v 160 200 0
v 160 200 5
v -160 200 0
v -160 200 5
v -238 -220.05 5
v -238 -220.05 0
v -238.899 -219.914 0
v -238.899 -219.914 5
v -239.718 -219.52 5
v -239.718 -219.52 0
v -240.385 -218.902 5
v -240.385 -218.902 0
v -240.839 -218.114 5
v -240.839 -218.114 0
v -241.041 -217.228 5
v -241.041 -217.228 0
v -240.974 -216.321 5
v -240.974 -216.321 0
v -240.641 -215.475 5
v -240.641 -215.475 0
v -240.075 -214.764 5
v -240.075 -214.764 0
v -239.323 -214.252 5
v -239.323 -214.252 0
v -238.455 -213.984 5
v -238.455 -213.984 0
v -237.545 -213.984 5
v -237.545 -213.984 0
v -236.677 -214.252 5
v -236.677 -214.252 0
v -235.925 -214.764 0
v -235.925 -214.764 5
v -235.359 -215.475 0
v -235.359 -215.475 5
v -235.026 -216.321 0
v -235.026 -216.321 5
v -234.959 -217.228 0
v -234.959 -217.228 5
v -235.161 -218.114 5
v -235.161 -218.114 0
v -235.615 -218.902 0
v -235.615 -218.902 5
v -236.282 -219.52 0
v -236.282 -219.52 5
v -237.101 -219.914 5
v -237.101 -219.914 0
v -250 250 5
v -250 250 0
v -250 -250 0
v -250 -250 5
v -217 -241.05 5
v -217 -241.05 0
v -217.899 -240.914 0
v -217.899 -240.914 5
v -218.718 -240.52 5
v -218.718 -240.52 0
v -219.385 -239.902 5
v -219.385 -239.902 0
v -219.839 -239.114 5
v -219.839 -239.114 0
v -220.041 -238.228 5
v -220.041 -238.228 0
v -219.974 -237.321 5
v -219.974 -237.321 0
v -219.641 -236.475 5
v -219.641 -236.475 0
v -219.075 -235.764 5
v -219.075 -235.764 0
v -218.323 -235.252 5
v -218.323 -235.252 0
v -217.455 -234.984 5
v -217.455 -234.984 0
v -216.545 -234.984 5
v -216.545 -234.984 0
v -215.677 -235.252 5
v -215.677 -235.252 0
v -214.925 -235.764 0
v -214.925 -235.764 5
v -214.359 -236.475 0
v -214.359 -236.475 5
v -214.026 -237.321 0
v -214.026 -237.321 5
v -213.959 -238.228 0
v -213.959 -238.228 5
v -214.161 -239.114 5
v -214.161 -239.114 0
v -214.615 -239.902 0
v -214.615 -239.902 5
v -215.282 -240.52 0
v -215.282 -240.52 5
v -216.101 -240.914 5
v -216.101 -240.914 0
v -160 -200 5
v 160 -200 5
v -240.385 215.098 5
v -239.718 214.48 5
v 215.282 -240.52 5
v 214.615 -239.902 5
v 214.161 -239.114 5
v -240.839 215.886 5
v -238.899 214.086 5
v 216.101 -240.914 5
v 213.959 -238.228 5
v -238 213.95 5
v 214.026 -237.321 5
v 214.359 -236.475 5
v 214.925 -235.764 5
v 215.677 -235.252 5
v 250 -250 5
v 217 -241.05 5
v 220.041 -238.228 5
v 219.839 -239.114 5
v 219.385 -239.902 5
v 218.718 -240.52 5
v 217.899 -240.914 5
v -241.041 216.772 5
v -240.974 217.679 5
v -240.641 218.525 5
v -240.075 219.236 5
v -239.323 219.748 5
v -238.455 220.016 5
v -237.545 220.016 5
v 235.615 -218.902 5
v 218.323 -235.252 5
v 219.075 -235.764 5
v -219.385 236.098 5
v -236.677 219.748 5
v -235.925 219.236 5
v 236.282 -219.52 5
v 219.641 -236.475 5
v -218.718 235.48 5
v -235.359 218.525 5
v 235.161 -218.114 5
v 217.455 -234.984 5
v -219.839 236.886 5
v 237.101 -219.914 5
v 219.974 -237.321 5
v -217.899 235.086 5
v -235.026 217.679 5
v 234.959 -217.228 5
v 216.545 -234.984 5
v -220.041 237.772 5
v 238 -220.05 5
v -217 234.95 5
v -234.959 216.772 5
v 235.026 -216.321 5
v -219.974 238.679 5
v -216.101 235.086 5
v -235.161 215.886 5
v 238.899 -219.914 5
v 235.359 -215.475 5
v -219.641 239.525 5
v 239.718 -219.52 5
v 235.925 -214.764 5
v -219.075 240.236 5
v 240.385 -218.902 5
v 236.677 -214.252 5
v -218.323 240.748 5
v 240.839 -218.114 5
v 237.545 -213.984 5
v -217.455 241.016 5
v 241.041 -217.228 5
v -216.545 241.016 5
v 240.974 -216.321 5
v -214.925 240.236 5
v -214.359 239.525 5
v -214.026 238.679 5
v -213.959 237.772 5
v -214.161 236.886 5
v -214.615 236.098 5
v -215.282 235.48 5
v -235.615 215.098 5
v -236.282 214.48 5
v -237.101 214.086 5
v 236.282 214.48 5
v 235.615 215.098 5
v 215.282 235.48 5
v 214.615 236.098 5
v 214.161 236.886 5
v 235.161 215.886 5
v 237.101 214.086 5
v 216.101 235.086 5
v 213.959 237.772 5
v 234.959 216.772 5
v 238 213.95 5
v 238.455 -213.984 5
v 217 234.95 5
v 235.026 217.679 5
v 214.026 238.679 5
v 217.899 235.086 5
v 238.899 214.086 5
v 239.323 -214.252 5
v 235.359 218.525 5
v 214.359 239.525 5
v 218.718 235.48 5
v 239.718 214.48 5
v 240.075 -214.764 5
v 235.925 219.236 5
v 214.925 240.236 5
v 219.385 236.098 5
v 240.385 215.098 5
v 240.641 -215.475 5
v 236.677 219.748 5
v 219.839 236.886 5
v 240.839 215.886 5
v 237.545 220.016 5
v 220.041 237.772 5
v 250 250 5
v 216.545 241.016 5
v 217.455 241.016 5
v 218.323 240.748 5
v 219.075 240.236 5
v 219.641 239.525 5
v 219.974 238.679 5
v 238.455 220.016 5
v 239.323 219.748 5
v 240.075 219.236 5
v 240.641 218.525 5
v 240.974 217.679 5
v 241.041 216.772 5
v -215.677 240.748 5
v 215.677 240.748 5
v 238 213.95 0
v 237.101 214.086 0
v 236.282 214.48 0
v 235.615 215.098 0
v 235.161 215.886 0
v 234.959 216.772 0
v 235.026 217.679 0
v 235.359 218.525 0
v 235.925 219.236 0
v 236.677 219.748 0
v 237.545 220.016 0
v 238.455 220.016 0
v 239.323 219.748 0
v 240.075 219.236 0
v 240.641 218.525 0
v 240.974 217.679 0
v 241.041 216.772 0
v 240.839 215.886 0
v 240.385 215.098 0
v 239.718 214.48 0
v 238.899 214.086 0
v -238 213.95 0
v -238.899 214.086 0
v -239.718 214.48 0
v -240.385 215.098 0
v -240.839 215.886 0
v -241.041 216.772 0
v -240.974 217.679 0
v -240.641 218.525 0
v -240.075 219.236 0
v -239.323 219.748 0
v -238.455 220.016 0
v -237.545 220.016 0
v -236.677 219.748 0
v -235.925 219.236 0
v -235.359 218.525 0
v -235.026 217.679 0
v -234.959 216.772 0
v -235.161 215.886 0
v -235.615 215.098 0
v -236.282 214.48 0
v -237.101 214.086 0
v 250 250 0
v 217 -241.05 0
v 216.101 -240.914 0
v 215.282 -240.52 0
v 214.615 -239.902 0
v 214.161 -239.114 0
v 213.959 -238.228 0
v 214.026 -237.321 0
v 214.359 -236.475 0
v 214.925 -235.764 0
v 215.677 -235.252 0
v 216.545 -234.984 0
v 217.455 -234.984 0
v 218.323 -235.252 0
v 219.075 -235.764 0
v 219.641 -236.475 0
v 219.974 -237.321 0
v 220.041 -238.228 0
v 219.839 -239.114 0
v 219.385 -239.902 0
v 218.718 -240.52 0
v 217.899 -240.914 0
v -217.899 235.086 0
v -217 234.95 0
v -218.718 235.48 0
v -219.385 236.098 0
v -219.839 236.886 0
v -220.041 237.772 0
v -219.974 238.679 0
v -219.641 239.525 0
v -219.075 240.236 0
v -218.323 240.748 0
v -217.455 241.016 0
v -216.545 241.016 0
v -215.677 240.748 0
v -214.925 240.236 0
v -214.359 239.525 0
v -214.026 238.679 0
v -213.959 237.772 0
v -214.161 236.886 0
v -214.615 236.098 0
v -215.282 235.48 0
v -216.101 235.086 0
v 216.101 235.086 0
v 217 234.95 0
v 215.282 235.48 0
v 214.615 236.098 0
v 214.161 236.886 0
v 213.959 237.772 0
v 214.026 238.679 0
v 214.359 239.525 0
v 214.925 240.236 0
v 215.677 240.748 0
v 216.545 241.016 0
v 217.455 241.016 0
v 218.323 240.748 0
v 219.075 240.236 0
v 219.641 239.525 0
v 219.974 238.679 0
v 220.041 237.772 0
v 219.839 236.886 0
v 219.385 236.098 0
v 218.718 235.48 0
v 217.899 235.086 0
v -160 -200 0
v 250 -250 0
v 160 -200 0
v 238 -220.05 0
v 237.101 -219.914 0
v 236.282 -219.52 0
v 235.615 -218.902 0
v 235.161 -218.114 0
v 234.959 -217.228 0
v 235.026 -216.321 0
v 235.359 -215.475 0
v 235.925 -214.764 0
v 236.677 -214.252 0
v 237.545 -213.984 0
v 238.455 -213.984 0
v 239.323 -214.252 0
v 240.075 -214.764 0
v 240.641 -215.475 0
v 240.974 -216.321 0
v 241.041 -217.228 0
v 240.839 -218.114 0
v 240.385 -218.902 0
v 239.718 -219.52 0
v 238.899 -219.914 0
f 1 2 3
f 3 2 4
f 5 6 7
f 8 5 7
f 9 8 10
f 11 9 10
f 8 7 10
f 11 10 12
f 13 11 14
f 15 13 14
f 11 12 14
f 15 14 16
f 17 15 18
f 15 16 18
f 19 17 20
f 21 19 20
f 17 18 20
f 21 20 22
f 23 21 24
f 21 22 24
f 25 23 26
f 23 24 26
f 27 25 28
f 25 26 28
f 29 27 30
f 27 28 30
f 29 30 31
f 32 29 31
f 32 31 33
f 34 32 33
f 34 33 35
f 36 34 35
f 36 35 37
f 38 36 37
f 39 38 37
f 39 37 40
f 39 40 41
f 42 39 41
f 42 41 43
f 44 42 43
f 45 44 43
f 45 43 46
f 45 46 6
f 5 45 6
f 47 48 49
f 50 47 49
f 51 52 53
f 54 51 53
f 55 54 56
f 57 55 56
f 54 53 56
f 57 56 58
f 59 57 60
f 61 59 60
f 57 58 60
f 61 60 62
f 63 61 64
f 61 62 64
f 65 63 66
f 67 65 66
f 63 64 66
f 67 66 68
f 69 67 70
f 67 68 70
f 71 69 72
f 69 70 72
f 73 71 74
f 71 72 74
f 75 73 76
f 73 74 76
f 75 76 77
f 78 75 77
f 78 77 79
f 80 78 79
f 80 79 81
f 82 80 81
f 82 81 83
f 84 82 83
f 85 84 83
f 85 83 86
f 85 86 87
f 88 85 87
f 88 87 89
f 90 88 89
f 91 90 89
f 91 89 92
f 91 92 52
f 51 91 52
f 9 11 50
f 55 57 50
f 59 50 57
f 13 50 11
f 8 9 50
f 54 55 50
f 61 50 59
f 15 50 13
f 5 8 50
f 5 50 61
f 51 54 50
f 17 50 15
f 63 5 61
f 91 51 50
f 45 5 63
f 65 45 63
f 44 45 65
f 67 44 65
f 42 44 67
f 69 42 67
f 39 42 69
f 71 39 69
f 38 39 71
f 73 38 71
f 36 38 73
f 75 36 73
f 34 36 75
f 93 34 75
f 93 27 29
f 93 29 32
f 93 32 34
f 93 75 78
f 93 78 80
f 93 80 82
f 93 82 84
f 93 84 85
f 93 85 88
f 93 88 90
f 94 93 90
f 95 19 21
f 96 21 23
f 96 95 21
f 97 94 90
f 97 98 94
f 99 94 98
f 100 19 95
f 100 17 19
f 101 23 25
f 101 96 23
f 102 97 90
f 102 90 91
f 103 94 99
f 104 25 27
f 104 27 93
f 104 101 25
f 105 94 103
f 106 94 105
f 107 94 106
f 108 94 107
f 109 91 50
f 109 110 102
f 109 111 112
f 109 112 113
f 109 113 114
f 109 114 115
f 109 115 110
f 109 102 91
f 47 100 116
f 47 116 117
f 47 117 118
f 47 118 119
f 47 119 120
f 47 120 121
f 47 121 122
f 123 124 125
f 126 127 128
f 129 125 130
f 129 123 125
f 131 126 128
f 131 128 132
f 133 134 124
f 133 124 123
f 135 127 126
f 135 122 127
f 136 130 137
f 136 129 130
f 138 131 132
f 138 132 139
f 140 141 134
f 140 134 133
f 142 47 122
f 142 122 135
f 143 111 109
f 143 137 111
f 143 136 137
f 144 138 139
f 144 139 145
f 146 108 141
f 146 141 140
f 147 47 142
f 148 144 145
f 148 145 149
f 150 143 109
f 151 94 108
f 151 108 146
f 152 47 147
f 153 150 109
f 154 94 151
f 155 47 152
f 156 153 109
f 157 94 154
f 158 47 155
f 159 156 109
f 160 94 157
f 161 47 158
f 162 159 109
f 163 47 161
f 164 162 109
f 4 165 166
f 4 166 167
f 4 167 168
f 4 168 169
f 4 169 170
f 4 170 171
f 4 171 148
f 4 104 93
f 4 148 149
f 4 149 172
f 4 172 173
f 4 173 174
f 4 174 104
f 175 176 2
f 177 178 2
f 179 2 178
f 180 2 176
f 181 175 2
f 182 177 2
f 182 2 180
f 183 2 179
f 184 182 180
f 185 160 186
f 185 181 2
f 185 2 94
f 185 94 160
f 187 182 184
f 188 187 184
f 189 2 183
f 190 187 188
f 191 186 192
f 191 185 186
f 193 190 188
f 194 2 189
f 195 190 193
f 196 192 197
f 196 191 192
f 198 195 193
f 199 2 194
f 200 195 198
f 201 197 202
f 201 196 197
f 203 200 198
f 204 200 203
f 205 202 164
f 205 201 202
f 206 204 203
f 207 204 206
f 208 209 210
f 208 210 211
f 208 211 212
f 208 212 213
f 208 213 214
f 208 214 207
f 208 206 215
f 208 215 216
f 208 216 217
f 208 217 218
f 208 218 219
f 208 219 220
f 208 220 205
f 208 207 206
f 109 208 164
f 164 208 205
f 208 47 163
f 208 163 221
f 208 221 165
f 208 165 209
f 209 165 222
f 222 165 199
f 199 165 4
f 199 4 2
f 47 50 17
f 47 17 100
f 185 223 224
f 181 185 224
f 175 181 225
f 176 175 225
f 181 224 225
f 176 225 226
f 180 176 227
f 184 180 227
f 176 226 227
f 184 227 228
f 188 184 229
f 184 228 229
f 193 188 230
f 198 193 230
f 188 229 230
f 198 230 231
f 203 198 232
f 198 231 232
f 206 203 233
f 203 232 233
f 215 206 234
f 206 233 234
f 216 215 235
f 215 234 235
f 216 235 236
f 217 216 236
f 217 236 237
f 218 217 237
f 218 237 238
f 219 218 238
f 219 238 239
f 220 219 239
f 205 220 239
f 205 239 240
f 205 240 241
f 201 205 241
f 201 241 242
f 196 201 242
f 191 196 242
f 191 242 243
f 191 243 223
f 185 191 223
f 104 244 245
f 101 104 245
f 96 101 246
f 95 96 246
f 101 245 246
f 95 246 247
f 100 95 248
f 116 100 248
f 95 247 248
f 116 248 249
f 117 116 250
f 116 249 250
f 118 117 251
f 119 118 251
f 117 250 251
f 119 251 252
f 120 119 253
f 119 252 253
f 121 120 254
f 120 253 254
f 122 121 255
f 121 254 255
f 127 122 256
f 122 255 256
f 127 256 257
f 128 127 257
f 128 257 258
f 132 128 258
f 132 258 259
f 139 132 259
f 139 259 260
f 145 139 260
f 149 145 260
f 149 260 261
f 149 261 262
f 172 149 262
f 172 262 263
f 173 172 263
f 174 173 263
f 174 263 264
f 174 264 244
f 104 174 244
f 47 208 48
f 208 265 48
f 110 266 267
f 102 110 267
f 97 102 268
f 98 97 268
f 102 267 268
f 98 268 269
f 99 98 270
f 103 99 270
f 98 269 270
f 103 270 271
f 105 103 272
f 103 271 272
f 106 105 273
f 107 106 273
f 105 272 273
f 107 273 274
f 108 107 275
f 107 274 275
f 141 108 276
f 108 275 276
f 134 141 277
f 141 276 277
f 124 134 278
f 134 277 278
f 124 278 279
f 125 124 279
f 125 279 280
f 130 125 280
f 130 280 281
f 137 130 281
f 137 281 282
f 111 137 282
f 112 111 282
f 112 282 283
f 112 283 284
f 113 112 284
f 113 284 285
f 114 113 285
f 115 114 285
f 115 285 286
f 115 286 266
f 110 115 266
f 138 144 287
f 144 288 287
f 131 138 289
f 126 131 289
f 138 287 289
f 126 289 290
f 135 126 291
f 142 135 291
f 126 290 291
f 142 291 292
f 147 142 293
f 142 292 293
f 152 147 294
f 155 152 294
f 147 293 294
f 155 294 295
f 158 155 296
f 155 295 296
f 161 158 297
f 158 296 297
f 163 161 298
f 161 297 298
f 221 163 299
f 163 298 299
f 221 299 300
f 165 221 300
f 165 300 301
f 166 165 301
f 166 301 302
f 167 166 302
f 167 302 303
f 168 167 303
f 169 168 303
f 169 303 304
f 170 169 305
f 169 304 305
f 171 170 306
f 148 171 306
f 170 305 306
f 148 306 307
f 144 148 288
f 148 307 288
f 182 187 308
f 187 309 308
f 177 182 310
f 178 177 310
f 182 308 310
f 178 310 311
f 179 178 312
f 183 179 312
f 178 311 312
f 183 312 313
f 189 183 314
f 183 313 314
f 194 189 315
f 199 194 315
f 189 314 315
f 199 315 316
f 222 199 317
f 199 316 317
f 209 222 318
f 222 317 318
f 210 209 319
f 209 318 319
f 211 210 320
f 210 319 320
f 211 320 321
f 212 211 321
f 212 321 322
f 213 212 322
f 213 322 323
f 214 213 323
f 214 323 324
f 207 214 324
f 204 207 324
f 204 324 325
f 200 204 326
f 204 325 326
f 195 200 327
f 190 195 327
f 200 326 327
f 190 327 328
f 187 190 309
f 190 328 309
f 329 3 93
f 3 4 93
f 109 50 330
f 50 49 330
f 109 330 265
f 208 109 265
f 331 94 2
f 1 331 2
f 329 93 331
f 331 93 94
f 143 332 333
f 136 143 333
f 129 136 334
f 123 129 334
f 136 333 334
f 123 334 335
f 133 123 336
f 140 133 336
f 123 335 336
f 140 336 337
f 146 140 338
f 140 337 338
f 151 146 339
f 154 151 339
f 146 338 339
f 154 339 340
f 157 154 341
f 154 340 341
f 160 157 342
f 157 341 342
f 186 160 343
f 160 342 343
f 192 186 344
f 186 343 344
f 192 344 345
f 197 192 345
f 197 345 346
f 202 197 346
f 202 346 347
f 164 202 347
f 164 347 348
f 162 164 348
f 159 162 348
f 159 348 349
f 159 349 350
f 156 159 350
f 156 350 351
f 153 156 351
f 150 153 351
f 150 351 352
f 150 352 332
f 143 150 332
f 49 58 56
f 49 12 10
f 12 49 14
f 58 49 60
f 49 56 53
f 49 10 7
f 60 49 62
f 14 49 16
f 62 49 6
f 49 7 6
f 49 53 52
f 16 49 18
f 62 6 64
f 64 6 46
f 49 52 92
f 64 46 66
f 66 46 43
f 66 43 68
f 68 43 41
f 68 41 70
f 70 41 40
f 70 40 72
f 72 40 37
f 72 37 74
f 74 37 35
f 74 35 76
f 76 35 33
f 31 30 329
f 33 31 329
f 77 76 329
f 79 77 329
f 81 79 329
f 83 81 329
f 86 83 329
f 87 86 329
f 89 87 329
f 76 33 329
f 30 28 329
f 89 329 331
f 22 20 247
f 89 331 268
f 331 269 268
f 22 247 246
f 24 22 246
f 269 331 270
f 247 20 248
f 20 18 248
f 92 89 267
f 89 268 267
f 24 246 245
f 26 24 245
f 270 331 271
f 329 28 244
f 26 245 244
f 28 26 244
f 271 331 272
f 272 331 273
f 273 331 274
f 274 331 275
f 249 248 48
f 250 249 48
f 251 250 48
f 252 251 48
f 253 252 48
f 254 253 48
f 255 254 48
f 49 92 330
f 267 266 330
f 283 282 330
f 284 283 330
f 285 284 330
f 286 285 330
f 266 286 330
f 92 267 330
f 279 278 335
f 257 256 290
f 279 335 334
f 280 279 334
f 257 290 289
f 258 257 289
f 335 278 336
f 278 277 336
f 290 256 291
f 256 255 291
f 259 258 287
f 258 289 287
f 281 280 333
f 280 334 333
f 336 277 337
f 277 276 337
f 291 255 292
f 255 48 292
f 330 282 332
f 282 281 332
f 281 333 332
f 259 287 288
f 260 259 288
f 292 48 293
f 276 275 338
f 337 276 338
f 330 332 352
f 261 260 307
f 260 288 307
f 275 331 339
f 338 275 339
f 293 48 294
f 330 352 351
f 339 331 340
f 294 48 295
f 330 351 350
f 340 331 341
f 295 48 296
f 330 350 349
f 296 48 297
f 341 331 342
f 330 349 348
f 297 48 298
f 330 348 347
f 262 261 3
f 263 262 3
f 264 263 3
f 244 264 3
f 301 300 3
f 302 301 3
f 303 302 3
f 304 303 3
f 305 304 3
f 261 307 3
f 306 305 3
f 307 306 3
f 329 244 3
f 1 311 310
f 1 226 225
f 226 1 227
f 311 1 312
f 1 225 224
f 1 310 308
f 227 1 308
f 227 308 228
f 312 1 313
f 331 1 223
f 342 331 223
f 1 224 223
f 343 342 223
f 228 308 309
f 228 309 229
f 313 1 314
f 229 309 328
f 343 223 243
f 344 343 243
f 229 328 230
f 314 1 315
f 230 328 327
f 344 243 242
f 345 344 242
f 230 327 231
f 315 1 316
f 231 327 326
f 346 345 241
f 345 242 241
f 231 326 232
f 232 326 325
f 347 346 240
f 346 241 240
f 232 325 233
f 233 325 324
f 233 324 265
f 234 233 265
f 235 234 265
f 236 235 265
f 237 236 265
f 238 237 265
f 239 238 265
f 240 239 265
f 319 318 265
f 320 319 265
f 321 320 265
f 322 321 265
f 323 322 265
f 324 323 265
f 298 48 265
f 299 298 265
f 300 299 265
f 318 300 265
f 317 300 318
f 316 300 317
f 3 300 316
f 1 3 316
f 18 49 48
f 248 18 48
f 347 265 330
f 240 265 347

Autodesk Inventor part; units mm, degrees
ref_plane "YZ Plane" through (0, 0, 0) normal (1, 0, 0) x (0, 1, 0)
ref_plane "XZ Plane" through (0, 0, 0) normal (0, 1, 0) x (-1, 0, 0)
ref_plane "XY Plane" through (0, 0, 0) normal (0, 0, 1) x (1, 0, 0)
sketch "Skizze1" plane through (0, 0, 0) normal (0, 0, 1) x (1, 0, 0)
  line L0 (-250, -250) -> (250, -250)
  line L1 (250, -250) -> (250, 250)
  line L2 (250, 250) -> (-250, 250)
  line L3 (-250, 250) -> (-250, -250)
  line L4 (-250, -250) -> (250, 250) construction
  line L5 (250, -250) -> (-250, 250) construction
  point P0 (0, 0)
  dimension "d0" = 500
  dimension "d1" = 500
extrude "Extrusion1" add sketch "Skizze1" along normal blind 5
sketch "Skizze2" plane through (0, 0, 5) normal (0, 0, 1) x (1, 0, 0)
  line L0 (250, 250) -> (-250, 250) projected
  line L1 (-250, 250) -> (-250, -250) projected
  line L2 (0, -350) -> (0, 350) projected
  line L3 (-350, 0) -> (350, 0) projected
  point P0 (0, 0)
  point P1 (-238, 217)
  point P2 (-217, 238)
  point P3 (238, 217)
  point P4 (217, 238)
  point P5 (-238, -217)
  point P6 (-217, -238)
  point P7 (217, -238)
  point P8 (238, -217)
  dimension "d4" = 33
  dimension "d5" = 33
  dimension "d6" = 12
  dimension "d7" = 12
hole "Bohrung1" at (-238, 217, 5) at (-217, 238, 5) at (217, 238, 5) at (238, 217, 5) at (-238, -217, 5) at (-217, -238, 5) at (217, -238, 5) at (238, -217, 5) direction (0, 0, -1) diameter 6.1 end through all
sketch "Skizze3" plane through (0, 0, 5) normal (0, 0, 1) x (1, 0, 0)
  line L0 (-160, -200) -> (160, -200)
  line L1 (160, -200) -> (160, 200)
  line L2 (160, 200) -> (-160, 200)
  line L3 (-160, 200) -> (-160, -200)
  line L4 (-160, -200) -> (160, 200) construction
  line L5 (160, -200) -> (-160, 200) construction
  point P0 (0, 0)
  dimension "d15" = 320
  dimension "d16" = 400
extrude "Extrusion2" cut sketch "Skizze3" against normal through all
properties part number "Hinterwand"
